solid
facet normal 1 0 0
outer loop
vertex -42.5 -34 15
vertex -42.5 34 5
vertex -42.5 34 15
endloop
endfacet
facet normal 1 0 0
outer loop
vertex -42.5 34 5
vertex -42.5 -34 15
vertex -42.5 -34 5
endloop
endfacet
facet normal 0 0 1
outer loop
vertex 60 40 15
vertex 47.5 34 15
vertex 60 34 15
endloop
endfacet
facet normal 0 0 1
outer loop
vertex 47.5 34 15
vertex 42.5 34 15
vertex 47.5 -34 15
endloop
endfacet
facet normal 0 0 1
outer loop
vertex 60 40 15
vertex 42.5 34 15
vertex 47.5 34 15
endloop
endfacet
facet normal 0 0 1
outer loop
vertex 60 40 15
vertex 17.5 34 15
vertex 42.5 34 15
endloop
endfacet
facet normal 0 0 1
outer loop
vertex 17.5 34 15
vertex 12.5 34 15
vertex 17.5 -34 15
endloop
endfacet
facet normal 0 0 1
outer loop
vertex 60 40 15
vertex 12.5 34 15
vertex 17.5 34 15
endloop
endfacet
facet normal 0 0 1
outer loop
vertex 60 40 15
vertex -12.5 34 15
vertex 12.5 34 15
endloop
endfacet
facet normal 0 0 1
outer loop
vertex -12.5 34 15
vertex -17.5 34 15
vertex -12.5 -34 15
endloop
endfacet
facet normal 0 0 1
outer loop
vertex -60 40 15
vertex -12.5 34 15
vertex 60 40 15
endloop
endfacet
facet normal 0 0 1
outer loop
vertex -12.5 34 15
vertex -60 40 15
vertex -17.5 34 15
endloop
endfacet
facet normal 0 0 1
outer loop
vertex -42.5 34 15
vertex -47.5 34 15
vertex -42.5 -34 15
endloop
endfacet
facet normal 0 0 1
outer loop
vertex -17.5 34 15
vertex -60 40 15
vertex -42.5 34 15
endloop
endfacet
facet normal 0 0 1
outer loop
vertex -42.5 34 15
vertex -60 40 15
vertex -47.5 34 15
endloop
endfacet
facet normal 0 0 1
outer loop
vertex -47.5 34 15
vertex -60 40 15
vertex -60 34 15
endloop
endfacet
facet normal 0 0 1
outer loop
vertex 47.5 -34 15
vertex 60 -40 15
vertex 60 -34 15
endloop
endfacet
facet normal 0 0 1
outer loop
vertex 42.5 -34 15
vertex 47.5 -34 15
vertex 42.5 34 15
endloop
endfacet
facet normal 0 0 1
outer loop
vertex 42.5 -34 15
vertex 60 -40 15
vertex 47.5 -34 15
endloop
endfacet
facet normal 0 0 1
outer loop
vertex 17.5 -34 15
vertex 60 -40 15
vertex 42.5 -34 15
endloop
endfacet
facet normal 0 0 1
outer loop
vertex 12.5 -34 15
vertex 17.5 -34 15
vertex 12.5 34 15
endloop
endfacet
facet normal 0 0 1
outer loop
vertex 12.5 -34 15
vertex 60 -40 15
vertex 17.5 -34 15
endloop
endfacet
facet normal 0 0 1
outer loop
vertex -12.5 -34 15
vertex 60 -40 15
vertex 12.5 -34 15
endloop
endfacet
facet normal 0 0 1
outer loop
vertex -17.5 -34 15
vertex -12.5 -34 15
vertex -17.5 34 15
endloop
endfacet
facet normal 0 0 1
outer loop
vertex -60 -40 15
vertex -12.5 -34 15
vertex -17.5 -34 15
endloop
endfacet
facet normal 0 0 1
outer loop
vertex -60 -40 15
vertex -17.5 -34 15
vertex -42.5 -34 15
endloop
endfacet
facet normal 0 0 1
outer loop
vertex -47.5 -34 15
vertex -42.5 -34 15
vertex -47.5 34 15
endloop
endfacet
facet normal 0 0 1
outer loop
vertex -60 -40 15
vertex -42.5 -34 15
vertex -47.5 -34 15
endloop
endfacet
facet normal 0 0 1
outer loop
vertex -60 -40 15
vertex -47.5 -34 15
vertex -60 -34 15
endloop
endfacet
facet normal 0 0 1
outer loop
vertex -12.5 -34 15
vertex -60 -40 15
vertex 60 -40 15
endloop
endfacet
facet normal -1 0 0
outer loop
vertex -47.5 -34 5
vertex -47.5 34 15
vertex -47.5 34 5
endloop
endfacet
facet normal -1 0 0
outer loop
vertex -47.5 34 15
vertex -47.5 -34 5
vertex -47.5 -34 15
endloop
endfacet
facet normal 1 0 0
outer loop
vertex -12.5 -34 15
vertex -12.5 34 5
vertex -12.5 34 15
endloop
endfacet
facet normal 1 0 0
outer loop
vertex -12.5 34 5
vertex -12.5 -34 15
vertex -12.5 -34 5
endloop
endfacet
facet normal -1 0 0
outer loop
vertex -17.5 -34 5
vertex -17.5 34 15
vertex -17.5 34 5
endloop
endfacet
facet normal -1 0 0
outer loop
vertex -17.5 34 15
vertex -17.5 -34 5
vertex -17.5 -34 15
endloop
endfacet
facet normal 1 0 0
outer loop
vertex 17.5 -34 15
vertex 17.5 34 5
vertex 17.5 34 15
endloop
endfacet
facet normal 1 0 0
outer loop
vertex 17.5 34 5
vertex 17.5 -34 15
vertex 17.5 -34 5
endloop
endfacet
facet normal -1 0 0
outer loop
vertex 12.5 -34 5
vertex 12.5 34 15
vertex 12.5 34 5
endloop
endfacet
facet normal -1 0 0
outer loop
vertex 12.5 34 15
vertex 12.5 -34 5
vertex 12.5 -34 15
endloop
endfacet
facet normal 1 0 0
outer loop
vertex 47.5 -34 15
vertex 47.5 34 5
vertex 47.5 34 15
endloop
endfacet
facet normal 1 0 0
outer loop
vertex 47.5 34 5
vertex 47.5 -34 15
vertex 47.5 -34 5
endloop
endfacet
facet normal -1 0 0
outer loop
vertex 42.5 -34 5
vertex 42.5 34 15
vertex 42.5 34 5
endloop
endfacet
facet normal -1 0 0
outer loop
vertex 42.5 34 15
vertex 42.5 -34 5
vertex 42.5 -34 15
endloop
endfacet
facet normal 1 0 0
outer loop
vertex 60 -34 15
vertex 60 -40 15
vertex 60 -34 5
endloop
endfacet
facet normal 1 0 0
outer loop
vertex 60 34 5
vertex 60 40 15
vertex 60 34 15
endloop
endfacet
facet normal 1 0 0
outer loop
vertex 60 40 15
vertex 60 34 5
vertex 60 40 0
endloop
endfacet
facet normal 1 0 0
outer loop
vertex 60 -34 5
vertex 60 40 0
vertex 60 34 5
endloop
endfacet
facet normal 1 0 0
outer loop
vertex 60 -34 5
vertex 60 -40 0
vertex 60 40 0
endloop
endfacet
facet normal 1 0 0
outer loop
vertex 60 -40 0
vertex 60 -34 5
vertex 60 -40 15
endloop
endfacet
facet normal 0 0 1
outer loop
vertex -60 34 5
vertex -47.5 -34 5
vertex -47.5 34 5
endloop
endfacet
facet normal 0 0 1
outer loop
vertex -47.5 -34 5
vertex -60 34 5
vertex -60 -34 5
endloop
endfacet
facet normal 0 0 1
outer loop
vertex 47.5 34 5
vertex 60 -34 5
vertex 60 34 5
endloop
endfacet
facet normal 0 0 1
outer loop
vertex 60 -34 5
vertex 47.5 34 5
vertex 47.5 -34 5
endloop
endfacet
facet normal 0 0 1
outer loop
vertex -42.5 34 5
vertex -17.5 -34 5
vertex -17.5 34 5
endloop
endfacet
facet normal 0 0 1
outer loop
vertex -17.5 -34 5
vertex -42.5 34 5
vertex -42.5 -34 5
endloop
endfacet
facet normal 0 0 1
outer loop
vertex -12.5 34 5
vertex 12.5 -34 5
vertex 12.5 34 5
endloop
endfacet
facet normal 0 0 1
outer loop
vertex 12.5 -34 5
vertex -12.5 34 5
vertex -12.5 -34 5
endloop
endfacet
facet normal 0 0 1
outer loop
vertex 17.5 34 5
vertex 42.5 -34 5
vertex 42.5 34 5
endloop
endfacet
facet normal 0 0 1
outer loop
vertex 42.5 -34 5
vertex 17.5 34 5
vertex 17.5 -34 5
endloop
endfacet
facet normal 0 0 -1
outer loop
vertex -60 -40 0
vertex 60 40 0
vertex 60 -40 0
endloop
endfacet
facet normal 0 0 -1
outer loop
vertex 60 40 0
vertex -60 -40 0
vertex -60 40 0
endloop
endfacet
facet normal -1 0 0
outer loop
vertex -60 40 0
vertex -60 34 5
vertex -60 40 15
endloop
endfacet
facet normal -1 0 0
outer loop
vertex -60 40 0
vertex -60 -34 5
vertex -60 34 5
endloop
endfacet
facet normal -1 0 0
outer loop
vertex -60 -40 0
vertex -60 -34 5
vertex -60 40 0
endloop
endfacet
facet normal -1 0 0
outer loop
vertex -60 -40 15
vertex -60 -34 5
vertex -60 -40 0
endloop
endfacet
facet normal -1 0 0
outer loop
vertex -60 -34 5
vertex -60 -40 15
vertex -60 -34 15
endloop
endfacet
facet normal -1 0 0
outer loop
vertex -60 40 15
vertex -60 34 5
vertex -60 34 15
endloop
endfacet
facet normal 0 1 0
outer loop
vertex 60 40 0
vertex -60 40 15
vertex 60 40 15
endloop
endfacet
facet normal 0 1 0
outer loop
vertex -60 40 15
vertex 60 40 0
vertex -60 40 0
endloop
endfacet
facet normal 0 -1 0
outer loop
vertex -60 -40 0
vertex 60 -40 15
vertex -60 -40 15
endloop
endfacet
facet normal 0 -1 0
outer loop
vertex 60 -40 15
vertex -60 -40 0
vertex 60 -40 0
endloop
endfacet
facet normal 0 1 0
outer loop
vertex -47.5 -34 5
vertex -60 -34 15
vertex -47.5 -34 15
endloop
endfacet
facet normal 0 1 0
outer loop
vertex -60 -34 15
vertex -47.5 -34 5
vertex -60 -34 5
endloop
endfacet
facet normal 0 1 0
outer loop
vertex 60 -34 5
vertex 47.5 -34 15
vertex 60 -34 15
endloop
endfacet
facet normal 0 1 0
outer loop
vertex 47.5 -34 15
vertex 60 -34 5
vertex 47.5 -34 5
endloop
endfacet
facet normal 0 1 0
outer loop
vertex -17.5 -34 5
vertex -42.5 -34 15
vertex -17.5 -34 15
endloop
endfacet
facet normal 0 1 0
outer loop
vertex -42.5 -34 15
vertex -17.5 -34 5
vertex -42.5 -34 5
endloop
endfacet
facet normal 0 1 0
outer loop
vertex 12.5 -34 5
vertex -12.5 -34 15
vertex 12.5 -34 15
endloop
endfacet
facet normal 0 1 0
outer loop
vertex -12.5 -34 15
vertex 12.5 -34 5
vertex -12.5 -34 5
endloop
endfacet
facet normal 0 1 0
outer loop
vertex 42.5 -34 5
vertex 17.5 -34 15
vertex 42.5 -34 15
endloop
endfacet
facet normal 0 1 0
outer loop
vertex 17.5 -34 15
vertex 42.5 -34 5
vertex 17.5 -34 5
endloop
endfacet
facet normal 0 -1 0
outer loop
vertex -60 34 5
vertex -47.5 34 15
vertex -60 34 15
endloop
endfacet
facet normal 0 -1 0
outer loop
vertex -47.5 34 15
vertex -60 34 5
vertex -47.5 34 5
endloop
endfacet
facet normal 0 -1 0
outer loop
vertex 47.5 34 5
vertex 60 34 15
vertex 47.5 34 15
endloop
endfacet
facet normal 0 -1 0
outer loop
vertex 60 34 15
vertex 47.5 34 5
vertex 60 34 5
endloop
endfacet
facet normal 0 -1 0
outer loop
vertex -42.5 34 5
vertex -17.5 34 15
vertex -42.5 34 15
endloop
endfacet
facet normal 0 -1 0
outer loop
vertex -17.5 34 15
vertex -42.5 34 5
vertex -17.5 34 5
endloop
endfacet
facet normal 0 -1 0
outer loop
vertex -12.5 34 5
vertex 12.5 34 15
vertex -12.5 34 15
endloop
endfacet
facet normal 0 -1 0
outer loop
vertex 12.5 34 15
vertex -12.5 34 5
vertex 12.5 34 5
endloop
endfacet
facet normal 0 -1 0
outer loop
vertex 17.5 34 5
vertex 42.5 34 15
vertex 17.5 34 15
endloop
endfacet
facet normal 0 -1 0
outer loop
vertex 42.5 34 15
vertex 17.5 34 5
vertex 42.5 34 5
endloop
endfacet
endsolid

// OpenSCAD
$fn = 32;

// ----------------------------------------------------------------------
// Rib frame 120 x 80 x 15
// 4 ribs at 30 mm pitch
// ----------------------------------------------------------------------

// --- parameters (mm) ---
frame = [120, 80, 5];  // base plate size (x, y, z)
rail_w = 6;            // side rail width
ribs = 4;              // number of ribs
rib_t = 5;             // rib thickness
rib_h = 10;            // rib height above the base plate
pitch = 30;            // pitch between rib centres

// --- derived feature positions (mm) ---
span = (ribs - 1) * pitch;          // = 90   distance between the outer ribs
origin_x = -span / 2;               // = -45   X of the first rib
rib_len = frame[1] - 2 * rail_w + 2;  // = 70   rib length, 1 mm into each rail
feature_centers = [
  [origin_x + 0 * pitch, 0],
  [origin_x + 1 * pitch, 0],
  [origin_x + 2 * pitch, 0],
  [origin_x + 3 * pitch, 0]
];   // rib centre line, drives the rib loop

// base plate, two side rails, then the ribs read straight off feature_centers
union() {
  translate([-frame[0] / 2, -frame[1] / 2, 0]) cube(frame);
  translate([-frame[0] / 2, -frame[1] / 2, 0]) cube([frame[0], rail_w, frame[2] + rib_h]);
  translate([-frame[0] / 2, frame[1] / 2 - rail_w, 0]) cube([frame[0], rail_w, frame[2] + rib_h]);
  for (centre = feature_centers)
    translate([centre[0] - rib_t / 2, centre[1] - rib_len / 2, frame[2] - 1])
      cube([rib_t, rib_len, rib_h + 1]);
}
